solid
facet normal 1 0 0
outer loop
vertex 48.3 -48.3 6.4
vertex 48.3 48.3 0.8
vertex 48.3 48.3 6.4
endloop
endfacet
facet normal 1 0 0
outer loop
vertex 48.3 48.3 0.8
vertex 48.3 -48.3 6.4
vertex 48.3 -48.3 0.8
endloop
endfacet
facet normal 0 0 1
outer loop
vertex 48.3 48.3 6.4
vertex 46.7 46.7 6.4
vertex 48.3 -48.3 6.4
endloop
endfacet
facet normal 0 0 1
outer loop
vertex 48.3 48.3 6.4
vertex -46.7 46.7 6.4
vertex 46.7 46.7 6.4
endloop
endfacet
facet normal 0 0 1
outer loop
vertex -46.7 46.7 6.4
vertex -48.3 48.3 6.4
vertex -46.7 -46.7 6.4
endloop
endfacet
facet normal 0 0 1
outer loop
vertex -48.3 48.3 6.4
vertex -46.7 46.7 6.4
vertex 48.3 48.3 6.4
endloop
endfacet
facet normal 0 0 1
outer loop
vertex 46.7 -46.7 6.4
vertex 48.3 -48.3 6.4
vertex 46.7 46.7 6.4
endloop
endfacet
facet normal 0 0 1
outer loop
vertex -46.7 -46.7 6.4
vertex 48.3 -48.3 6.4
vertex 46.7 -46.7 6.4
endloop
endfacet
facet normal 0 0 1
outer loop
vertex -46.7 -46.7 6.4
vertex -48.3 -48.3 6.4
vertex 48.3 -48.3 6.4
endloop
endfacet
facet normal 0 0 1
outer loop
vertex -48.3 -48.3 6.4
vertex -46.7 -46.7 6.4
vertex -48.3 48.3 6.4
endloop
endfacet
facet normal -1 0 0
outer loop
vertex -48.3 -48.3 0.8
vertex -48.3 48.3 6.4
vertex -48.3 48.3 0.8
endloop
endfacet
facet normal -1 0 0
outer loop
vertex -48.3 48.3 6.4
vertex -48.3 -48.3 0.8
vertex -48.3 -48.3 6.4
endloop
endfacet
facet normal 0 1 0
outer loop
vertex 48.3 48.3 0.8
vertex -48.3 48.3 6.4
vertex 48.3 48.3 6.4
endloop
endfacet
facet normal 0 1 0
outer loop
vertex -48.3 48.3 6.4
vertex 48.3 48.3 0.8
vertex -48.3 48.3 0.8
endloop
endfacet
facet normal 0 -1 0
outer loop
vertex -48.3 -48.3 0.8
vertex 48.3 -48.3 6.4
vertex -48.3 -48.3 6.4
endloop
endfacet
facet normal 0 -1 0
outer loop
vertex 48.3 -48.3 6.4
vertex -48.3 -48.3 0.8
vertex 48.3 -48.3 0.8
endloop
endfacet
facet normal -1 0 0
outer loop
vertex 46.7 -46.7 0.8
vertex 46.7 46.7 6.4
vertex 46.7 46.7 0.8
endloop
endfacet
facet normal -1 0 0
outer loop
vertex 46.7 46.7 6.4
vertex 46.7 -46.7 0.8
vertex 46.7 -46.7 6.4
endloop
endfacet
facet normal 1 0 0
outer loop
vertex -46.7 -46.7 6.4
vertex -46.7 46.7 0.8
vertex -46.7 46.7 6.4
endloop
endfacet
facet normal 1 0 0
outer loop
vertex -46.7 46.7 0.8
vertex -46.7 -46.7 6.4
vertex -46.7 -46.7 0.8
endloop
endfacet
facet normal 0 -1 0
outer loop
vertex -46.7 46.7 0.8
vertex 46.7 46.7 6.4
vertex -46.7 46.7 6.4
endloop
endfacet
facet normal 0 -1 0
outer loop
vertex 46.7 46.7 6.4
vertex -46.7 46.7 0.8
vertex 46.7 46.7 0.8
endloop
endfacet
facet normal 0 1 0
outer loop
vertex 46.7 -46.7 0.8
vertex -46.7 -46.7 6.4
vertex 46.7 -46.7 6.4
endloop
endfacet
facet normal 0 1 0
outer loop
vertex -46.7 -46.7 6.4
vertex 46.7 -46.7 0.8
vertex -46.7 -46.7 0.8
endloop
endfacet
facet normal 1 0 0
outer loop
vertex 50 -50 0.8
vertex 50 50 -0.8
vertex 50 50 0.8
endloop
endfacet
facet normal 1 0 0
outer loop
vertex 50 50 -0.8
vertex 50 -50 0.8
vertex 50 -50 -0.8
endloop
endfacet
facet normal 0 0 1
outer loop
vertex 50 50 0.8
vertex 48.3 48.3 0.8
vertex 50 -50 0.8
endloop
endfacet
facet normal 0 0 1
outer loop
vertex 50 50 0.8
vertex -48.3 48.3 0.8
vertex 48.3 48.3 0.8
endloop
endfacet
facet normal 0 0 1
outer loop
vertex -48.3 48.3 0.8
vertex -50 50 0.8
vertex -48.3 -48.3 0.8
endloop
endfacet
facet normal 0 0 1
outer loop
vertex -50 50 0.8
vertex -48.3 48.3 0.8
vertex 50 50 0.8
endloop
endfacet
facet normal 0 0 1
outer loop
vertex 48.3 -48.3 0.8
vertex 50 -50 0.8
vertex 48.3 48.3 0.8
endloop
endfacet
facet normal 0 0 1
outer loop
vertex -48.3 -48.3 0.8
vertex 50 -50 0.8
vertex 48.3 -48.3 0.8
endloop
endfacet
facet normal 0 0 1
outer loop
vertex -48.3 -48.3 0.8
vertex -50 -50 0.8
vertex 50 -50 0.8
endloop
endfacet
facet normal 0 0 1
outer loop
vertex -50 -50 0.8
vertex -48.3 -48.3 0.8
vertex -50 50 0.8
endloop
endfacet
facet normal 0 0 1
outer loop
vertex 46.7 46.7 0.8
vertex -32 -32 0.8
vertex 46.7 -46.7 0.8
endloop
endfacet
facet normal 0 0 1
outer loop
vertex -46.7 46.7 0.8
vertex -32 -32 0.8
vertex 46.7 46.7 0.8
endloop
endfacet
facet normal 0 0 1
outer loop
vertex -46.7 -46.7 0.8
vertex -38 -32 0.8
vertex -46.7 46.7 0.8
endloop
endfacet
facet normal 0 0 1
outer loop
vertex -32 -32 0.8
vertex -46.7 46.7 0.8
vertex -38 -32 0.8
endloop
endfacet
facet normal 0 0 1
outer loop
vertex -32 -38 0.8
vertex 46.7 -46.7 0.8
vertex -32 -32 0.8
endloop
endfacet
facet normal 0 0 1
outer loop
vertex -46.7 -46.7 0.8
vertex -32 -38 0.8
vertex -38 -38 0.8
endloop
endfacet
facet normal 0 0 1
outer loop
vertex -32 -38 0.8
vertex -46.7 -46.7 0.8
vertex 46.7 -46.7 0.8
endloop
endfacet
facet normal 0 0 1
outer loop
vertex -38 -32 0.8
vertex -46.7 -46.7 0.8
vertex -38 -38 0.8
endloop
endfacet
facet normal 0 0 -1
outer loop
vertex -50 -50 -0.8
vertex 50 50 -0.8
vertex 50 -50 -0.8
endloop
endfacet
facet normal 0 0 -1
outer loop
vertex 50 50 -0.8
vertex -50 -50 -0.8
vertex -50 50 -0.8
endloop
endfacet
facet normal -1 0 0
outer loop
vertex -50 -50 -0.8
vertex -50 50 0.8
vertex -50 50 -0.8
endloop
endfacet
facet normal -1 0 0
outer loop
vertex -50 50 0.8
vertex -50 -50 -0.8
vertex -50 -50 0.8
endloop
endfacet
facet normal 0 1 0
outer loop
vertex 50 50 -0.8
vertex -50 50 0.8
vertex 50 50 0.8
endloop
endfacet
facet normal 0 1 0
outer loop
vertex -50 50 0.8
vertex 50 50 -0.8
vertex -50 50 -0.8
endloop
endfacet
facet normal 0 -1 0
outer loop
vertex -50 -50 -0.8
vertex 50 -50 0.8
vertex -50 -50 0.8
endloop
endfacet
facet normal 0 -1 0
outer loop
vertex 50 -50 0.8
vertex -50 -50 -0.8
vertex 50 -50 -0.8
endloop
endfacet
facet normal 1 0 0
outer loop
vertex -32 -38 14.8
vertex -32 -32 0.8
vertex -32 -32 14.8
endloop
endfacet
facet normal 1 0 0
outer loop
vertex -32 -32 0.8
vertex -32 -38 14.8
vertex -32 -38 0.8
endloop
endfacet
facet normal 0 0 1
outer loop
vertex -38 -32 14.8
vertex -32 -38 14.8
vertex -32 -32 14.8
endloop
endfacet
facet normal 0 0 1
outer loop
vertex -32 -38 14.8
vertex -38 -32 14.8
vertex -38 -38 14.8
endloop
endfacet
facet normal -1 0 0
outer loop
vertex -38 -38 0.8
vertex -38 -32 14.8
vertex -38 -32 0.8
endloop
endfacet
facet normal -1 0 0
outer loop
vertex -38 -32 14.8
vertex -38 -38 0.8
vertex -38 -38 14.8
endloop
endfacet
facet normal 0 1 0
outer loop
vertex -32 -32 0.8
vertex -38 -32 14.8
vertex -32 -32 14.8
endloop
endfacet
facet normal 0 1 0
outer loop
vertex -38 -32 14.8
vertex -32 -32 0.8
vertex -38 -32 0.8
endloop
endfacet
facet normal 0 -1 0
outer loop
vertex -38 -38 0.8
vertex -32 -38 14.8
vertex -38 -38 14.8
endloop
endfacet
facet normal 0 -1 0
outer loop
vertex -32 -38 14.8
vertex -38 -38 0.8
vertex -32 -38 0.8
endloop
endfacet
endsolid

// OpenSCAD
// Case for raspi w - with ping to website ability
$fn=360;
labels_only=0;
wall_thickness=1.6;
case_width=100;
case_length=100;
case_depth=20;
pcb_width=22;
pcb_length=53;
pcb_depth=10;
pcb_hole_diameter=2;
lug_diameter=3;
lug_height=2;
lug_width=11;
lug_length=47;

//text_font="Arial:style=Regular";

text_font="Arial:style=Bold";


// 3mm led
//led_diameter=3.5;
// 5mm led
led_diameter=5.3;
led_clearance=10;
edge_clearance=10;

usb_width=12;
usb_height=6;

module usb_port() {
    cube([usb_width, usb_height*4, usb_height], true);
}

module mounting_lug() {
    cylinder(h=lug_height*2, d=pcb_hole_diameter-.1);
    cylinder(h=lug_height, d=lug_diameter);    
}

module mounting_lugs() {
    translate([lug_width/2,lug_length/2,0])
        mounting_lug();
    translate([-lug_width/2,lug_length/2,0])
        mounting_lug();
    translate([-lug_width/2,-lug_length/2,0])
        mounting_lug();
    translate([lug_width/2,-lug_length/2,0])
        mounting_lug();
}

module mounting_plate() {
    translate([pcb_width*1.5, -((pcb_length/2)-5), -wall_thickness*4]) {
        difference() {
            cube([pcb_width+(wall_thickness*2),pcb_length+(wall_thickness*2),wall_thickness*8], true);
            cube([pcb_width,pcb_length,wall_thickness*8], true);
        }
    }
    translate([pcb_width*1.5, -((pcb_length/2)-5), -wall_thickness/2]) {
        cube([pcb_width,pcb_length,wall_thickness], true);
    }
}

module case_front() {
    cube([case_width, case_length, wall_thickness], true);
    translate([-20,22,0]) {
        label();
    }
    translate([+20,22,0]) {
        label();
    }
    translate([-20,-25,0]) {
        label();
    }
    translate([+30,-25,0]) {
        label();
    }
}

module case_front_holes(led_wall=0, led_depth=-wall_thickness/2) {
    led_offset=0;
    // ping_led
    translate([-(case_width/2)+edge_clearance, (case_length/2)-edge_clearance, led_depth-led_offset]) {
        cylinder(h=wall_thickness*4, d=led_diameter+led_wall);
    }
    // google.com
    translate([0, (case_length/2)-edge_clearance, led_depth-led_offset]) {
        cylinder(h=wall_thickness*4, d=led_diameter+led_wall);
    }
    // garage_wifi
    translate([0, ((case_length/2)-edge_clearance)-(led_clearance*1), led_depth-led_offset]) {
        cylinder(h=wall_thickness*4, d=led_diameter+led_wall);
    }
    // garage_lan
//    translate([0, ((case_length/2)-edge_clearance)-(led_clearance*1), led_depth]) {
//        cylinder(h=wall_thickness*4, d=led_diameter+led_wall);
//    }
    // google_wifi
    translate([0, ((case_length/2)-edge_clearance)-(led_clearance*2), led_depth-led_offset]) {
        cylinder(h=wall_thickness*4, d=led_diameter+led_wall);
    }
    // google_lan
//    translate([0, ((case_length/2)-edge_clearance)-(led_clearance*2), led_depth]) {
//        cylinder(h=wall_thickness*4, d=led_diameter+led_wall);
//    }
    // switch_a
    translate([0, ((case_length/2)-edge_clearance)-(led_clearance*3), led_depth-led_offset]) {
        cylinder(h=wall_thickness*4, d=led_diameter+led_wall);
    }
    // switch_b
    translate([0, ((case_length/2)-edge_clearance)-(led_clearance*4), led_depth-led_offset]) {
        cylinder(h=wall_thickness*4, d=led_diameter+led_wall);
    }

    // apple_tv_a_wifi
    translate([-(case_width/2)+edge_clearance, ((case_length/2)-edge_clearance)-(led_clearance*5), led_depth-led_offset]) {
        cylinder(h=wall_thickness*4, d=led_diameter+led_wall);
    }
    // apple_tv_a
//    translate([-(case_width/2)+edge_clearance*1.5, ((case_length/2)-edge_clearance)-(led_clearance*5), led_depth]) {
//        cylinder(h=wall_thickness*4, d=led_diameter+led_wall);
//    }
    // apple_tv_b_wifi
    translate([edge_clearance-3, ((case_length/2)-edge_clearance)-(led_clearance*5), led_depth-led_offset]) {
        cylinder(h=wall_thickness*4, d=led_diameter+led_wall);
    }
    // apple_tv_b
//    translate([edge_clearance*1.5, ((case_length/2)-edge_clearance)-(led_clearance*5), led_depth]) {
//        cylinder(h=wall_thickness*4, d=led_diameter+led_wall);
//    }
    // bike_tv_a_wifi
    translate([-(case_width/2)+edge_clearance, ((case_length/2)-edge_clearance)-(led_clearance*6), led_depth-led_offset]) {
        cylinder(h=wall_thickness*4, d=led_diameter+led_wall);
    }
    // bike_tv_a
//    translate([-(case_width/2)+edge_clearance*1.5, ((case_length/2)-edge_clearance)-(led_clearance*6), led_depth]) {
//        cylinder(h=wall_thickness*4, d=led_diameter+led_wall);
//    }
    // bike_tv_b_wifi
    translate([edge_clearance-3, ((case_length/2)-edge_clearance)-(led_clearance*6), led_depth-led_offset]) {
        cylinder(h=wall_thickness*4, d=led_diameter+led_wall);
    }
    // bike_tv_b
//    translate([edge_clearance*1.5, ((case_length/2)-edge_clearance)-(led_clearance*6), led_depth]) {
//        cylinder(h=wall_thickness*4, d=led_diameter+led_wall);
//    }
    // trainer_a_wifi
    translate([-(case_width/2)+edge_clearance, ((case_length/2)-edge_clearance)-(led_clearance*7), led_depth-led_offset]) {
        cylinder(h=wall_thickness*4, d=led_diameter+led_wall);
    }
    // trainer_a
//    translate([-(case_width/2)+edge_clearance*1.5, ((case_length/2)-edge_clearance)-(led_clearance*7), led_depth]) {
//        cylinder(h=wall_thickness*4, d=led_diameter+led_wall);
//    }
    // trainer_b_wifi
    translate([edge_clearance-3, ((case_length/2)-edge_clearance)-(led_clearance*7), led_depth-led_offset]) {
        cylinder(h=wall_thickness*4, d=led_diameter+led_wall);
    }
    // trainer_b
//    translate([edge_clearance*1.5, ((case_length/2)-edge_clearance)-(led_clearance*7), led_depth]) {
//        cylinder(h=wall_thickness*4, d=led_diameter+led_wall);
//    }
}


module case_labels() {
    // ping_led
    text_depth=1;
    #linear_extrude(text_depth) {
    translate([-(case_width/2)+edge_clearance+led_diameter, (case_length/2)-edge_clearance-1, -text_depth]) {
        text("power", size=5, font=text_font);
    }
    // google.com
    translate([led_diameter, (case_length/2)-edge_clearance-1, text_depth]) {
        text("internet", size=5, font=text_font);
    }
    // garage_wifi
    translate([led_diameter, ((case_length/2)-edge_clearance)-(led_clearance*1)-1, text_depth]) {
        text("garage", size=5, font=text_font);
    }
    // garage_lan
//    translate([0, ((case_length/2)-edge_clearance)-(led_clearance*1), led_depth]) {
//        cylinder(h=wall_thickness*4, d=led_diameter+led_wall);
//    }
    // google_wifi
    translate([led_diameter, ((case_length/2)-edge_clearance)-(led_clearance*2)-1, text_depth]) {
        text("google", size=5, font=text_font);
    }
    // google_lan
//    translate([0, ((case_length/2)-edge_clearance)-(led_clearance*2), led_depth]) {
//        cylinder(h=wall_thickness*4, d=led_diameter+led_wall);
//    }
    // switch_a
    translate([led_diameter, ((case_length/2)-edge_clearance)-(led_clearance*3)-1, text_depth]) {
        text("switch_a", size=5, font=text_font);
    }
    // switch_b
    translate([led_diameter, ((case_length/2)-edge_clearance)-(led_clearance*4)-1, text_depth]) {
        text("switch_b", size=5, font=text_font);
    }

    // apple_tv_a_wifi
    translate([-(case_width/2)+edge_clearance+led_diameter, ((case_length/2)-edge_clearance)-(led_clearance*5)-1, text_depth]) {
        text("apple_tv_a", size=5, font=text_font);
    }
    // apple_tv_a
//    translate([-(case_width/2)+edge_clearance*1.5, ((case_length/2)-edge_clearance)-(led_clearance*5), led_depth]) {
//        cylinder(h=wall_thickness*4, d=led_diameter+led_wall);
//    }
    // apple_tv_b_wifi
    translate([edge_clearance+led_diameter-3, ((case_length/2)-edge_clearance)-(led_clearance*5)-1, text_depth]) {
        text("apple_tv_b", size=5, font=text_font);
    }
    // apple_tv_b
//    translate([edge_clearance*1.5, ((case_length/2)-edge_clearance)-(led_clearance*5), led_depth]) {
//        cylinder(h=wall_thickness*4, d=led_diameter+led_wall);
//    }
    // bike_tv_a_wifi
    translate([-(case_width/2)+edge_clearance+led_diameter, ((case_length/2)-edge_clearance)-(led_clearance*6)-1, text_depth]) {
        text("bike_tv_a", size=5, font=text_font);
    }
    // bike_tv_a
//    translate([-(case_width/2)+edge_clearance*1.5, ((case_length/2)-edge_clearance)-(led_clearance*6), led_depth]) {
//        cylinder(h=wall_thickness*4, d=led_diameter+led_wall);
//    }
    // bike_tv_b_wifi
    translate([edge_clearance+led_diameter-3, ((case_length/2)-edge_clearance)-(led_clearance*6)-1, text_depth]) {
        text("bike_tv_b", size=5, font=text_font);
    }
    // bike_tv_b
//    translate([edge_clearance*1.5, ((case_length/2)-edge_clearance)-(led_clearance*6), led_depth]) {
//        cylinder(h=wall_thickness*4, d=led_diameter+led_wall);
//    }
    // trainer_a_wifi
    translate([-(case_width/2)+edge_clearance+led_diameter, ((case_length/2)-edge_clearance)-(led_clearance*7)-1, text_depth]) {
        text("trainer_a", size=5, font=text_font);
    }
    // trainer_a
//    translate([-(case_width/2)+edge_clearance*1.5, ((case_length/2)-edge_clearance)-(led_clearance*7), led_depth]) {
//        cylinder(h=wall_thickness*4, d=led_diameter+led_wall);
//    }
    // trainer_b_wifi
    translate([edge_clearance+led_diameter-3, ((case_length/2)-edge_clearance)-(led_clearance*7)-1, text_depth]) {
        text("trainer_b", size=5, font=text_font);
    }
    // trainer_b
//    translate([edge_clearance*1.5, ((case_length/2)-edge_clearance)-(led_clearance*7), led_depth]) {
//        cylinder(h=wall_thickness*4, d=led_diameter+led_wall);
//    }
    }
}



module display_holes() {
    difference() {
        union() {
            case_front();
            case_front_holes(2,-wall_thickness*3.5);
        }
        translate([0,0,0])
        case_front_holes(0, -wall_thickness*3.5);
    }
}

module label() {
    color("blue") {
//        cube([30,40,10], true);
    }
}

module walls() {
    translate([0,0,-case_depth/2]) {
        difference() {
            cube([case_width, case_length, case_depth], true);
            cube([case_width-(wall_thickness*2), case_length-(wall_thickness*2), case_depth], true);
            
        }
    }
}

module backPlate() {
    cube([case_width, case_length, wall_thickness], true);
    translate([0,0,wall_thickness*2])
    difference() {
        cube([(case_width-(wall_thickness*2))-.2, (case_length-(wall_thickness*2))-.2, wall_thickness*4], true);
        cube([(case_width-(wall_thickness*4))-.2, (case_length-(wall_thickness*4))-.2, wall_thickness*4], true);
    }
    peglength=14;
    translate([(-case_width/2)+15,(-case_length/2)+15,wall_thickness/2+(peglength/2)]) {
        cube([6,6,peglength], true);
    }
}

//difference() {
//    mounting_plate();
//    cylinder(h=wall_thickness, d=led_diameter);
//}

if(false) {
if (labels_only==0) {
    difference() {
        union() {
            display_holes();
            mounting_plate();
            walls();
                
        }
        translate([(case_width/2)-18,-((case_length/2)-wall_thickness*1.5),-wall_thickness*4]) {
            usb_port();
        }
        translate([0,0,-.2])
            case_labels();

    }
} else {
    if (labels_only==1) {
        translate([0,0,-.2])
            case_labels();
    } else {
        difference() {
            case_front_holes(0, -wall_thickness*3.5);

            translate([0,0,-0.4]) {

                case_front_holes(0, -wall_thickness*3.5);
            }
        }
    }
}
} else {
    backPlate();
}
